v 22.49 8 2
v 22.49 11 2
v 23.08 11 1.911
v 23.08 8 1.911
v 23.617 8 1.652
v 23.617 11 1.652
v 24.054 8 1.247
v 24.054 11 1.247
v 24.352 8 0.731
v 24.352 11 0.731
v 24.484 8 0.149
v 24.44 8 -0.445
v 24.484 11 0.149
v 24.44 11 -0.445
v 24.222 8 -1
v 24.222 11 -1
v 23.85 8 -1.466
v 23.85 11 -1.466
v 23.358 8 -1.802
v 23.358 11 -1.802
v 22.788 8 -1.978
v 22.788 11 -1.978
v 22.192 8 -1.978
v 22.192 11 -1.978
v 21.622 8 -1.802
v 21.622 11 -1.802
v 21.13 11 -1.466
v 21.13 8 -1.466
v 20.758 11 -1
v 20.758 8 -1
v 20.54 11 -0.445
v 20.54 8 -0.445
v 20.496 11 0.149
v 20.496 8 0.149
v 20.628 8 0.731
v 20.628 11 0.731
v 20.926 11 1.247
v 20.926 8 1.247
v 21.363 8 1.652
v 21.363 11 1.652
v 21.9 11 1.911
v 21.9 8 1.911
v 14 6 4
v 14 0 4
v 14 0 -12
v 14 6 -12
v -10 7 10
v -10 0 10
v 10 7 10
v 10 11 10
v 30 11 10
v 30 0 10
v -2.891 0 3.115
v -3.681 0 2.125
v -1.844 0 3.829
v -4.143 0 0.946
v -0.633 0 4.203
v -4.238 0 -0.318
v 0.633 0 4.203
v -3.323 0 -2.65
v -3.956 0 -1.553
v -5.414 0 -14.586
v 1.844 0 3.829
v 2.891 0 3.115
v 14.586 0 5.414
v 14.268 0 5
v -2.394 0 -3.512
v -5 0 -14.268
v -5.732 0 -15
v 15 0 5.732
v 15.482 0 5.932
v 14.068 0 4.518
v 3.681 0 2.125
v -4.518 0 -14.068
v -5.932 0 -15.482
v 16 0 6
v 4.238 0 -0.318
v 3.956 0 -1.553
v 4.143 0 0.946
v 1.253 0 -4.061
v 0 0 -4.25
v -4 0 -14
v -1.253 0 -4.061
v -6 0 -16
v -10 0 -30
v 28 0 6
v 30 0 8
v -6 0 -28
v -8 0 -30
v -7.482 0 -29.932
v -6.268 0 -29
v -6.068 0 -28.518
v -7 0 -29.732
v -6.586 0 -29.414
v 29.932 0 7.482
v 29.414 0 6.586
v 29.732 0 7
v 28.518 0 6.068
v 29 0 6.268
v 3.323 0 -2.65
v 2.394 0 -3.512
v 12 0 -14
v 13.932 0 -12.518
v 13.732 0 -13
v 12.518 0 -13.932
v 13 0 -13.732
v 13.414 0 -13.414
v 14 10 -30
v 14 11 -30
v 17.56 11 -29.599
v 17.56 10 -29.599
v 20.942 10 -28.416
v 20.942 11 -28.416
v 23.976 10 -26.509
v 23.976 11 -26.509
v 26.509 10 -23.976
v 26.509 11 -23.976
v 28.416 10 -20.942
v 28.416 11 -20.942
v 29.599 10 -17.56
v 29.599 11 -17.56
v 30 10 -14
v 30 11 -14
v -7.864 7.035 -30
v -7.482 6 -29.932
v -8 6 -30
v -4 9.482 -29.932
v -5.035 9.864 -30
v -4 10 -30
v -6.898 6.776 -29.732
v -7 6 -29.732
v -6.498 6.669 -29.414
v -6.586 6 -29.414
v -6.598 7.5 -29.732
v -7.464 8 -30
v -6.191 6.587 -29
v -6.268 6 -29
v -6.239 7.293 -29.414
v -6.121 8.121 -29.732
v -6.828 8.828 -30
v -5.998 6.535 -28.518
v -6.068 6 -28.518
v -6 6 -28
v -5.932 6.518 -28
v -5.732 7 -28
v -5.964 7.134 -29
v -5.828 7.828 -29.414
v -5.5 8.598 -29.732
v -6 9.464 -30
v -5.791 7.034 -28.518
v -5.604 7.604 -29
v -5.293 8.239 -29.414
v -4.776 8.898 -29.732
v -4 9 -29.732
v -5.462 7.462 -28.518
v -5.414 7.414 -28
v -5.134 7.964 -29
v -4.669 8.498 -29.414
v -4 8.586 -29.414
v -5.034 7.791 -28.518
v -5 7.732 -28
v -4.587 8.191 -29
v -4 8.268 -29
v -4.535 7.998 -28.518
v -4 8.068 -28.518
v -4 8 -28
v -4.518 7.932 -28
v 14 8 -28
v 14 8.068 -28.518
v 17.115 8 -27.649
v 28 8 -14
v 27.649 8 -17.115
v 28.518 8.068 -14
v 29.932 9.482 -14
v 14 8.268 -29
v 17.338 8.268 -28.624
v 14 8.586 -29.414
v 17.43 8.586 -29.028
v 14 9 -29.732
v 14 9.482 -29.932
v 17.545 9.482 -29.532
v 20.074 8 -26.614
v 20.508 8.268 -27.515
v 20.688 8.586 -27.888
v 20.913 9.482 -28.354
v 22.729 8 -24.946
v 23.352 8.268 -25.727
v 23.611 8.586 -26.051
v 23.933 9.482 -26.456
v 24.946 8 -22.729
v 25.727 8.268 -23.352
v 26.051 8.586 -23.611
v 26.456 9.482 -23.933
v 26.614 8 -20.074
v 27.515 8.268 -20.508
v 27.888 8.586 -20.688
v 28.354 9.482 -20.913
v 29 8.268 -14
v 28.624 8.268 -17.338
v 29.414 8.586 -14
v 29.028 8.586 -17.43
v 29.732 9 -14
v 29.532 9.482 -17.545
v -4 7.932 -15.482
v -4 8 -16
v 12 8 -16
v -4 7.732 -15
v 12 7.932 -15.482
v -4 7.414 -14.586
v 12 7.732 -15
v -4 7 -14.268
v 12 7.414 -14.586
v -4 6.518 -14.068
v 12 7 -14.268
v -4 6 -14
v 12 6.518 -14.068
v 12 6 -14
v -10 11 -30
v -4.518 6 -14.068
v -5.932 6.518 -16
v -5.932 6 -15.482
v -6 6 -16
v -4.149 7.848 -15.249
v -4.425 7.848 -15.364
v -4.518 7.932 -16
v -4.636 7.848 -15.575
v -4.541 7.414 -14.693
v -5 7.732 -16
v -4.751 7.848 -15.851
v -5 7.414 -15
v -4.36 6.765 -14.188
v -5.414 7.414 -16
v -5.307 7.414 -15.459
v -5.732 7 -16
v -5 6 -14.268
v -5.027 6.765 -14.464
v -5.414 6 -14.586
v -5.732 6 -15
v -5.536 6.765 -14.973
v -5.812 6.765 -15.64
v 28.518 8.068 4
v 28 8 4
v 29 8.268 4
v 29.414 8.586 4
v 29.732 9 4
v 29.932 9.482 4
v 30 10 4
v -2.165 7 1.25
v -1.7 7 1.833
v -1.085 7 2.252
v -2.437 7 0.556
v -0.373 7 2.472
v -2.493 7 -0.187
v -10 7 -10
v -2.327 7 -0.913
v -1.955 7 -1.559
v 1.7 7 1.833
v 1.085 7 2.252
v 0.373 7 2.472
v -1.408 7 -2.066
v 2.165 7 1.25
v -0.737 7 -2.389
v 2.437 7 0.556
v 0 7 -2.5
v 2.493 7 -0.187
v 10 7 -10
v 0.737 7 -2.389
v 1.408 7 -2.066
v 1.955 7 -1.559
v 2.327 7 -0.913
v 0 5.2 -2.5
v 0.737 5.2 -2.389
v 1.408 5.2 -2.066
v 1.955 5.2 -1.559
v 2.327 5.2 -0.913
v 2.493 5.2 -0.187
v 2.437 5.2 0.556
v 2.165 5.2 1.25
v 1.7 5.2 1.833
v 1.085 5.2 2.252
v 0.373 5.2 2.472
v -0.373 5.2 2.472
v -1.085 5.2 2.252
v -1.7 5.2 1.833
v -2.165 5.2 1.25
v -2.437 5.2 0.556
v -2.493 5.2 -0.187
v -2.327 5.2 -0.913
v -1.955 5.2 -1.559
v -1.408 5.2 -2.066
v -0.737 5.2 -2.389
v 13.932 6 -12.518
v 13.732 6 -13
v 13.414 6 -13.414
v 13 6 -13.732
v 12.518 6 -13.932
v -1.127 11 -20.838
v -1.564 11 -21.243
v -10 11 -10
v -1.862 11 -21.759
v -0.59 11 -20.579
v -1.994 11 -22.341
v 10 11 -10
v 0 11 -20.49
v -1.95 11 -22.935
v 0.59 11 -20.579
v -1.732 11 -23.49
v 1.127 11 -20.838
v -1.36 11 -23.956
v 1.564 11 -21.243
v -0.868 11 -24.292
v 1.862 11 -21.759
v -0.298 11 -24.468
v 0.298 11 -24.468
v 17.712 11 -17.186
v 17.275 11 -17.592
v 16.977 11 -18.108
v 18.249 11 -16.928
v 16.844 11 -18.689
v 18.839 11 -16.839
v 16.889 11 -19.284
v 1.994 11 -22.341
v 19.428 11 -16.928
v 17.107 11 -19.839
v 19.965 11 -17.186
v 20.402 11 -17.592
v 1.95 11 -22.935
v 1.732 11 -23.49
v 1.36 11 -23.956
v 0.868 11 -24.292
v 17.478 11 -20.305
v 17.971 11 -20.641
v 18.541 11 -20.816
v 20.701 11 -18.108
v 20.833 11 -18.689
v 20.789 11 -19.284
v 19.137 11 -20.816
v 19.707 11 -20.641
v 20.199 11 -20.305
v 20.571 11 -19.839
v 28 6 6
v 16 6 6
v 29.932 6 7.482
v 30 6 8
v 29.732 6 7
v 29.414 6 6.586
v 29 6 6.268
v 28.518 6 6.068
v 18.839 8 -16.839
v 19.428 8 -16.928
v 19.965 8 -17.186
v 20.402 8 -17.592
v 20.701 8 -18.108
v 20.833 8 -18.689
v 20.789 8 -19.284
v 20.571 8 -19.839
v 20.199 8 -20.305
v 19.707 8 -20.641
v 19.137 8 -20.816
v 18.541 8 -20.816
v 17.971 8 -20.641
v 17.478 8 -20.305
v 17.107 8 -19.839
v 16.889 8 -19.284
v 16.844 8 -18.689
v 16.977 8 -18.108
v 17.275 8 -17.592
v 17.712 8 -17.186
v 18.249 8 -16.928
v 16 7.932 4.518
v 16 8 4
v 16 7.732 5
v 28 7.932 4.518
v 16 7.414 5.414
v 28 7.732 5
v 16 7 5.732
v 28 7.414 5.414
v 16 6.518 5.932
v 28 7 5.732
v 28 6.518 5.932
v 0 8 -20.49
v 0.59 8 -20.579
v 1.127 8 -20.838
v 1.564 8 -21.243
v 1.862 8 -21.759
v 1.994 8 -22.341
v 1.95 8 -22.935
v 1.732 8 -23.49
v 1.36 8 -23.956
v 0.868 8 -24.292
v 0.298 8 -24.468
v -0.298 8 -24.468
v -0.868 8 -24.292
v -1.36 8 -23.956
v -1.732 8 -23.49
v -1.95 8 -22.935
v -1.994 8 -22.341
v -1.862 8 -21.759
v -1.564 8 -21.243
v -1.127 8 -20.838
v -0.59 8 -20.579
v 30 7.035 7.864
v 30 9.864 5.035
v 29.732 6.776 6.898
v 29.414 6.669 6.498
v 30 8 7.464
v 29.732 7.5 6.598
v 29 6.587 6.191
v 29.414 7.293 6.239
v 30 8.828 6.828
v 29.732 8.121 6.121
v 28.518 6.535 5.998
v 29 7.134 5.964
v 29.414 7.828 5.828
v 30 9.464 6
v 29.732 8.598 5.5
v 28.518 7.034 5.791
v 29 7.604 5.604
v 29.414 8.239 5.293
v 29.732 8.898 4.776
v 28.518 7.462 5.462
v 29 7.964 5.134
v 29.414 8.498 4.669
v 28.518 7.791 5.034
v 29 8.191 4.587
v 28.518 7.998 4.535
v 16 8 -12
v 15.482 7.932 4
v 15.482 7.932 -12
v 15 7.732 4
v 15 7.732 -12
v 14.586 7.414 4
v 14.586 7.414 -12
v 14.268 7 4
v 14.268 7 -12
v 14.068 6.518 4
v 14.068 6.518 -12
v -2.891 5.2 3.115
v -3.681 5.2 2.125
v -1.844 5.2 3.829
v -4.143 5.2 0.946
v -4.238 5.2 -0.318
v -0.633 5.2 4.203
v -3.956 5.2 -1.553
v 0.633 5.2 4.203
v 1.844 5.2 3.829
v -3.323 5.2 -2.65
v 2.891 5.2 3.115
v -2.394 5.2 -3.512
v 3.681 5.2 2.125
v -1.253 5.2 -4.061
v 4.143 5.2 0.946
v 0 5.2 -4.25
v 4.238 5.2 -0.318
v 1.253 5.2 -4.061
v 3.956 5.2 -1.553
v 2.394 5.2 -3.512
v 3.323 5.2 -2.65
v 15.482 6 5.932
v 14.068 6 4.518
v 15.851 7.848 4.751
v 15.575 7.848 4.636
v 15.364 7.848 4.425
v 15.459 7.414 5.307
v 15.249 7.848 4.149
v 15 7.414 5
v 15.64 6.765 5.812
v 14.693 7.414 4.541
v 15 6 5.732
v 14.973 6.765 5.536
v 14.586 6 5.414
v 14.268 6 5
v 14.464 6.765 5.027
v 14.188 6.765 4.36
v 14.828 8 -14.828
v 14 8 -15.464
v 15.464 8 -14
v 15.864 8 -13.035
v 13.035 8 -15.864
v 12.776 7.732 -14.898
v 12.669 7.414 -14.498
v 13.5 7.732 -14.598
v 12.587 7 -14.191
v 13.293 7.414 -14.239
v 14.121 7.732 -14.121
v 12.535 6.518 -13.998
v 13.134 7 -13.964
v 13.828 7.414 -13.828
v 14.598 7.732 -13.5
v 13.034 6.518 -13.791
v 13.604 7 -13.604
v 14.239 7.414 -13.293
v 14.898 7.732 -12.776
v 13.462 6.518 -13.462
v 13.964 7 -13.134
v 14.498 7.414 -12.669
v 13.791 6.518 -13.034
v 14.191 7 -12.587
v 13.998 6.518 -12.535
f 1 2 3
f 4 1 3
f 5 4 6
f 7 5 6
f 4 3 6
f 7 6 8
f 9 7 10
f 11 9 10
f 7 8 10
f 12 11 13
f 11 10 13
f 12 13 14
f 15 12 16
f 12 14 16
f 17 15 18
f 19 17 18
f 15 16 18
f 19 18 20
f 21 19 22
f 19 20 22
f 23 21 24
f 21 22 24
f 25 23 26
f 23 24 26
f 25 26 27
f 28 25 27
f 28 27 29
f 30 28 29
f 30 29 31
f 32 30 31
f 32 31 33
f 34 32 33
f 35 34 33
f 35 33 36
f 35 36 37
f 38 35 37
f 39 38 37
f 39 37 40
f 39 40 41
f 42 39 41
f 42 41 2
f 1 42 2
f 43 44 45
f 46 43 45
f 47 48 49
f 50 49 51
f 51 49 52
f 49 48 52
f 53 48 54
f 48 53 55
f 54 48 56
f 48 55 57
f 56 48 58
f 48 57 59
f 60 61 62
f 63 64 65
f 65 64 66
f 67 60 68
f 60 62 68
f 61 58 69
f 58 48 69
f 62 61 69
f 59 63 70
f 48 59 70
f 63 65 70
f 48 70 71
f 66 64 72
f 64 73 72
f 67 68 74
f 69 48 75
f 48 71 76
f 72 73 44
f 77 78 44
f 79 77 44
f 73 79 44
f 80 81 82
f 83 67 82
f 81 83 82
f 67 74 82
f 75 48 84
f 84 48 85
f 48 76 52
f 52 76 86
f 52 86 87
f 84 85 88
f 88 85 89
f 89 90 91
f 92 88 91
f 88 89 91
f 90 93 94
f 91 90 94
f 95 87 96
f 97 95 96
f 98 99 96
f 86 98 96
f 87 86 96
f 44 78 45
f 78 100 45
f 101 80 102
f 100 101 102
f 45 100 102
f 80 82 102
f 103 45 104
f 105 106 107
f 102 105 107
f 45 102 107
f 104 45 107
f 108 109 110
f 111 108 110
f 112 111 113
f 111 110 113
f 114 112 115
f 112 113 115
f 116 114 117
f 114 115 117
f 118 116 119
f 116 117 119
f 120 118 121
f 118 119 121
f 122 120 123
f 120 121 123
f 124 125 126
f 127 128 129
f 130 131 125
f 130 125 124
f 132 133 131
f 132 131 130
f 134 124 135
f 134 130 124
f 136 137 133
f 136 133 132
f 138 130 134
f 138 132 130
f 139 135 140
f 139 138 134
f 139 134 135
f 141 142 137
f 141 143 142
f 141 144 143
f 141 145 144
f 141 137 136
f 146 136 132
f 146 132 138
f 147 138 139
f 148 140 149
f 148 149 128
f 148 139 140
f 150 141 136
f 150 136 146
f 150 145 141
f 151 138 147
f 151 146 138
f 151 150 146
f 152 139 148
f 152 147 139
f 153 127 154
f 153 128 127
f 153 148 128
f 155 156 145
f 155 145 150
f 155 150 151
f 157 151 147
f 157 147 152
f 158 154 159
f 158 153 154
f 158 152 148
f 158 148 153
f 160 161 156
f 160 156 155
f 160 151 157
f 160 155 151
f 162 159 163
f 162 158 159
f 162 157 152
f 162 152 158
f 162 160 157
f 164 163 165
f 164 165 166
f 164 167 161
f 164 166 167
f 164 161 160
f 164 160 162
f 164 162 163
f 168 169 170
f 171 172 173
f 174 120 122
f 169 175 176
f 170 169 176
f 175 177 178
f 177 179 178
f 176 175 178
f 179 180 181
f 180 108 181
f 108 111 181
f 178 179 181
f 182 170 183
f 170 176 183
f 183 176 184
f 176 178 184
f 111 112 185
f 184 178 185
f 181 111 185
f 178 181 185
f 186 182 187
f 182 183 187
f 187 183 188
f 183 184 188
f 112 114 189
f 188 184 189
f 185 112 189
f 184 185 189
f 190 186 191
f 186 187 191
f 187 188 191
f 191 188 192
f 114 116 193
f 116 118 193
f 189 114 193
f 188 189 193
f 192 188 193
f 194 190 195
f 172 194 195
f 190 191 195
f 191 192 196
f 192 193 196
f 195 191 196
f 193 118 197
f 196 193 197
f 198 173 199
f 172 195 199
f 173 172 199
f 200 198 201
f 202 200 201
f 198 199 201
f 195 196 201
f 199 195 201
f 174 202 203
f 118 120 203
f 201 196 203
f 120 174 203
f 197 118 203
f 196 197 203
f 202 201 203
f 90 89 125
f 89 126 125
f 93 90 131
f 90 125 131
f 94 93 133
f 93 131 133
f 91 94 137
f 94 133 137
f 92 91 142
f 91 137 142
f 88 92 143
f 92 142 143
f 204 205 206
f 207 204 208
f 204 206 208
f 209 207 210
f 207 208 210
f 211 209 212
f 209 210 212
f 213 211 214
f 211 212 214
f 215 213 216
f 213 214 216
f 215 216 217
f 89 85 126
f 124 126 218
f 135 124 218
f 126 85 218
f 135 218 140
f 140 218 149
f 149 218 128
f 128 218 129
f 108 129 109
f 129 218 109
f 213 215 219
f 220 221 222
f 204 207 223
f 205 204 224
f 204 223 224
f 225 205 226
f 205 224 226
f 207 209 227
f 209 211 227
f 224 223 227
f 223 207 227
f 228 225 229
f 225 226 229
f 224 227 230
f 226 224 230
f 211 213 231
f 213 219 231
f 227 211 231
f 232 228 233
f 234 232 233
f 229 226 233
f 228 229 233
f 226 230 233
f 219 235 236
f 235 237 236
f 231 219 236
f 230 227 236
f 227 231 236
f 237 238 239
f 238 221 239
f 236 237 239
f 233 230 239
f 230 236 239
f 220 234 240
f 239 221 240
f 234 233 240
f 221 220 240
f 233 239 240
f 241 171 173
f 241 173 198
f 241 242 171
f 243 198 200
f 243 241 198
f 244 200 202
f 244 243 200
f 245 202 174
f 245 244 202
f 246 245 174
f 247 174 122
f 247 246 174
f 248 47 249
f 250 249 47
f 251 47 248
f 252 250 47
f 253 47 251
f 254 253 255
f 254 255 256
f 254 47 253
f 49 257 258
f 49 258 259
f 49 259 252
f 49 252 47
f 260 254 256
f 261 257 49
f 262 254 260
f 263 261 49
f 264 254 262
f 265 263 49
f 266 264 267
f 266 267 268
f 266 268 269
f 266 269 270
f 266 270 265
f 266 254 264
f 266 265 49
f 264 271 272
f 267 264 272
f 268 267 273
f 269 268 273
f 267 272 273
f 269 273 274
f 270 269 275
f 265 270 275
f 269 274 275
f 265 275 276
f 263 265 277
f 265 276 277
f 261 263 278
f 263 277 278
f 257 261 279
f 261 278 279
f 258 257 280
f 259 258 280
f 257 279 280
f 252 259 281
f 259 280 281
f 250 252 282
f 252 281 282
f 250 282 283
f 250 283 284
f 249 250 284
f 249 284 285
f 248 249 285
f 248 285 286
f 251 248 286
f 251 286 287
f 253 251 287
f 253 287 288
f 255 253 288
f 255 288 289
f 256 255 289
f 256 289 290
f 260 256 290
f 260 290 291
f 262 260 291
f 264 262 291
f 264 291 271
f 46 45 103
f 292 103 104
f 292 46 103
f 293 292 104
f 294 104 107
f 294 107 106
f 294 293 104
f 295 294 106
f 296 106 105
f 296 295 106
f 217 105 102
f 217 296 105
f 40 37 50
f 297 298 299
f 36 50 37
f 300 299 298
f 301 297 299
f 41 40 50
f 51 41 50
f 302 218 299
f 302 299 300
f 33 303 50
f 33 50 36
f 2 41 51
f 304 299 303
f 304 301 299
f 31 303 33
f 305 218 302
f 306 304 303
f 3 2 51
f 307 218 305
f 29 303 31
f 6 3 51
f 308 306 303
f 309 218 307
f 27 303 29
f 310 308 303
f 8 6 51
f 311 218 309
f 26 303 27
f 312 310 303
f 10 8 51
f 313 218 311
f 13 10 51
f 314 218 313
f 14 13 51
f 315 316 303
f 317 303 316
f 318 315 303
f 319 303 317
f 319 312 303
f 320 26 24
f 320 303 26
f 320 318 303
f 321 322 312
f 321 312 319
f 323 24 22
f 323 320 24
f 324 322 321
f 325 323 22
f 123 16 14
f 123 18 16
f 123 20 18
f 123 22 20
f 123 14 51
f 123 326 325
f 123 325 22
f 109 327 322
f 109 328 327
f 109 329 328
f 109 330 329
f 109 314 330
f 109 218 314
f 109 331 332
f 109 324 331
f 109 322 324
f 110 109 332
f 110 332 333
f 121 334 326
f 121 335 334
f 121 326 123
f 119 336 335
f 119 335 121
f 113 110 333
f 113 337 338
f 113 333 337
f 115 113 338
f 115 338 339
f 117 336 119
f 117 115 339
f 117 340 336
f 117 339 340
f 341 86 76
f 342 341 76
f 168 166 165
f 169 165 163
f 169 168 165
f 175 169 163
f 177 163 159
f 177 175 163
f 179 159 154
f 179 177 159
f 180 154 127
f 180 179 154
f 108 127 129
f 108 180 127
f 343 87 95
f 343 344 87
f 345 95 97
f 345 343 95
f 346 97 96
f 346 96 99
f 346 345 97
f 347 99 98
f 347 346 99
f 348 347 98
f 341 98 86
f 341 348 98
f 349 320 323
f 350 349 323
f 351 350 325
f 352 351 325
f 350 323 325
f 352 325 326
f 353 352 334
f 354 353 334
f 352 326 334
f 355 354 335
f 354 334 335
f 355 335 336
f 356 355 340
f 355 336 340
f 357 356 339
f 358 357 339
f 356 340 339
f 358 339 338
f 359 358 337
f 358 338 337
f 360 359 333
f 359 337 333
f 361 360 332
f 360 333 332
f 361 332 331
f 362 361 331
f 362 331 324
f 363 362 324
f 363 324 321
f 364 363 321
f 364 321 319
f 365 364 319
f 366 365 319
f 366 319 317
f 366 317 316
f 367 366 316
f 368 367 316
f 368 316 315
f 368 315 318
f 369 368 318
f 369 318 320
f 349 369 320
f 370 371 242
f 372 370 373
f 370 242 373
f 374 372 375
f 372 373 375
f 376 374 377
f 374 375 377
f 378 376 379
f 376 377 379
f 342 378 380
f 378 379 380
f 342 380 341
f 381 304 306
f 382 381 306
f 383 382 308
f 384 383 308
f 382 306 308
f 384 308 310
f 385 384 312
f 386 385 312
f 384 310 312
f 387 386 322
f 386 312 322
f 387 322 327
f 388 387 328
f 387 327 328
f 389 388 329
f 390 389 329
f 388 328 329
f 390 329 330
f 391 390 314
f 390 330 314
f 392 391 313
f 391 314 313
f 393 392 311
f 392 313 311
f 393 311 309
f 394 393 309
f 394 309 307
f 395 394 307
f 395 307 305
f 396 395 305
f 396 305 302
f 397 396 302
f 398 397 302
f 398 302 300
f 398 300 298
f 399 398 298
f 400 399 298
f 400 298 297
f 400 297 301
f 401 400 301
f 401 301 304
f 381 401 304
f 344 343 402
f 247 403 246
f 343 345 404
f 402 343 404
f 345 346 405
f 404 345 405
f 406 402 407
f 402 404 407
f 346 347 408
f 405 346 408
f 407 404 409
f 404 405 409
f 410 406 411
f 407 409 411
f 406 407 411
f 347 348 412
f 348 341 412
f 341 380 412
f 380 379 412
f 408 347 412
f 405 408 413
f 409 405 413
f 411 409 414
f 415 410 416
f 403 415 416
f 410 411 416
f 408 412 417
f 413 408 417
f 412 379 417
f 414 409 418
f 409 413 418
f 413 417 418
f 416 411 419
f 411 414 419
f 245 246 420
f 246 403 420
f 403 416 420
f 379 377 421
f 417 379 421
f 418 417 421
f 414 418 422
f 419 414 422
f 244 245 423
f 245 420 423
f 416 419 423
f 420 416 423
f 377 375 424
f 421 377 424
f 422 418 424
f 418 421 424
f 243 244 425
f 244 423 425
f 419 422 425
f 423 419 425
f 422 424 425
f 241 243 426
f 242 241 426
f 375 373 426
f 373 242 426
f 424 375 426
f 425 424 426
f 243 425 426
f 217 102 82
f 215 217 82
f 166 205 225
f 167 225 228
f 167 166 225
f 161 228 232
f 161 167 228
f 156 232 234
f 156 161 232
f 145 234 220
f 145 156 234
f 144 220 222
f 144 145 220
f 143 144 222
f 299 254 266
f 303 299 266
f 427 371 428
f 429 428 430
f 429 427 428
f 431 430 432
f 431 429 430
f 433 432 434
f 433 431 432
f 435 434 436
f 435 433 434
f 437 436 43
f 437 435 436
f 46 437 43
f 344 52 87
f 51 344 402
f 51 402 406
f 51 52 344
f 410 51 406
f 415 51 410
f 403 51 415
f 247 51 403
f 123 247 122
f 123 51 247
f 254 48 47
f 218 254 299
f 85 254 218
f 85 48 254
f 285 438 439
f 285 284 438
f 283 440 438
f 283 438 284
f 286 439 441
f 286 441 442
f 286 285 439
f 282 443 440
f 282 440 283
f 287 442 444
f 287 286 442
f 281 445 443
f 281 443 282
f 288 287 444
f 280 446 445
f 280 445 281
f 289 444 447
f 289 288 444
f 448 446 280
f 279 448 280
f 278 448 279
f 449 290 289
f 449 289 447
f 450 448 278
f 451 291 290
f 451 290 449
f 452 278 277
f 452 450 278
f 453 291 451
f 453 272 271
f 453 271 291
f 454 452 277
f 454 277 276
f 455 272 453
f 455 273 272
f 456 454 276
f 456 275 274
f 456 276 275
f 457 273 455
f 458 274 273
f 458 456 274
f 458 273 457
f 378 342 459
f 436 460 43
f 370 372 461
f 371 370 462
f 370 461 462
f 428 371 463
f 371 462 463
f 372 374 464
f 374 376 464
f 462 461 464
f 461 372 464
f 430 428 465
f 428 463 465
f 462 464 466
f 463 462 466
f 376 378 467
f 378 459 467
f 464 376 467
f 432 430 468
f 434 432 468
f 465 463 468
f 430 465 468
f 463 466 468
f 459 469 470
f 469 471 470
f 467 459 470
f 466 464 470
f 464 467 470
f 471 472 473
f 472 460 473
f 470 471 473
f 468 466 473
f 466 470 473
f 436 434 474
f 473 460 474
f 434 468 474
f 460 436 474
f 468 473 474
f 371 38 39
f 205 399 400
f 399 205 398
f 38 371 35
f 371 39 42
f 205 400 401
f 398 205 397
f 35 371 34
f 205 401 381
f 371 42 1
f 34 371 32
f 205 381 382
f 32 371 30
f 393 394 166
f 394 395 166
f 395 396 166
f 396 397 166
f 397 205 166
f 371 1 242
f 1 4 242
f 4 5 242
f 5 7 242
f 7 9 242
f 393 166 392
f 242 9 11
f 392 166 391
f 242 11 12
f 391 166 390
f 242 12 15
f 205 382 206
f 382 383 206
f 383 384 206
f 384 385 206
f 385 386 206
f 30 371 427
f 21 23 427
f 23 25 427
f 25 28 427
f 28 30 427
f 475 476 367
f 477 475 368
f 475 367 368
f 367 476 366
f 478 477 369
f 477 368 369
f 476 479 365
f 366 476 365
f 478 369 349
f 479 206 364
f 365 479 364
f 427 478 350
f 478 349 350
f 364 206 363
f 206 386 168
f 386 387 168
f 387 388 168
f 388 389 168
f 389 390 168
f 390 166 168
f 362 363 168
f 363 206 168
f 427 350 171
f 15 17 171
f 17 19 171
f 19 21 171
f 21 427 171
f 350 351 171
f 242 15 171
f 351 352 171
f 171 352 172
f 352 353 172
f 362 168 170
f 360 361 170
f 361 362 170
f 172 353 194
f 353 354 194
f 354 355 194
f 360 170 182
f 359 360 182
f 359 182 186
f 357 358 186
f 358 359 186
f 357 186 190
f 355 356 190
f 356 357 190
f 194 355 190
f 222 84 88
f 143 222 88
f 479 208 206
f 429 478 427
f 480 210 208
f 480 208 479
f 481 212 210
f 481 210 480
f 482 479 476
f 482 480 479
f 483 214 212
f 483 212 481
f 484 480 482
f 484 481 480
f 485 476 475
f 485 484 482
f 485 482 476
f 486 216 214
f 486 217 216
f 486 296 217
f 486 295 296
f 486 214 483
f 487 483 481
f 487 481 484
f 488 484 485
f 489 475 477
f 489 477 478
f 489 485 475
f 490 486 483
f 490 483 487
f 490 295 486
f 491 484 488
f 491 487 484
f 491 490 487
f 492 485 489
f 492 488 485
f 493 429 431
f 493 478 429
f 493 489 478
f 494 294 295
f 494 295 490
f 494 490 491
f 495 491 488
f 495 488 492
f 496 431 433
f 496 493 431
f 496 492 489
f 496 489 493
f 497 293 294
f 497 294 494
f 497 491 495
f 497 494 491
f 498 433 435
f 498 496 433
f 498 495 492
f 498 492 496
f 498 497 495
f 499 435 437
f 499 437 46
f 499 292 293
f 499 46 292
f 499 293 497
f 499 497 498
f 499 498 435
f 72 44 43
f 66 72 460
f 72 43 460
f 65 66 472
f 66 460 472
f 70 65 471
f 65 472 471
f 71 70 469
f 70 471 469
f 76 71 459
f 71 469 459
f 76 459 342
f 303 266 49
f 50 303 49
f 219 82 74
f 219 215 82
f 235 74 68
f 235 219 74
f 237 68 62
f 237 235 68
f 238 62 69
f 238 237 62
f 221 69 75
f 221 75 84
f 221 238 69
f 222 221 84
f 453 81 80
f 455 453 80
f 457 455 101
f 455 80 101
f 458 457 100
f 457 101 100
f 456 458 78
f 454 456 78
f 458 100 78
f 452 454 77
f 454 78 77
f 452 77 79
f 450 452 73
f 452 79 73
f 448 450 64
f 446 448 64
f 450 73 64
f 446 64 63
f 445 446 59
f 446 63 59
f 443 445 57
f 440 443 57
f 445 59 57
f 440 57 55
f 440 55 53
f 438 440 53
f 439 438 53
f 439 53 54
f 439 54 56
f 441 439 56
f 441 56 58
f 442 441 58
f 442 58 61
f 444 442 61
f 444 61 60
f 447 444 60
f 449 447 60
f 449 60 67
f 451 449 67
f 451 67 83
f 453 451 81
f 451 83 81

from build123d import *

# Parameters (mm, degrees)
SKETCH1_W           = 4
SKETCH1_H           = 16
BOSS_EXTRUDE1_DEPTH = 11
SKETCH2_W           = 20
SKETCH2_H           = 20
BOSS_EXTRUDE2_DEPTH = 7
SKETCH3_W           = 20
SKETCH3_H           = 16
SKETCH3_W_2         = 16
SKETCH3_H_2         = 20
BOSS_EXTRUDE3_DEPTH = 3
FILLET1_R           = 2
SKETCH4_R           = 2.5
CUT_EXTRUDE1_DEPTH  = 10
SKETCH5_R           = 4.25
CUT_EXTRUDE2_DEPTH  = 5.2
SKETCH6_R           = 2
CUT_EXTRUDE3_DEPTH  = 5.2


with BuildPart() as part:
    # Sketch1 → Boss-Extrude1 (new body)
    with BuildSketch(Plane(origin=(0, 0, 0), x_dir=(1, 0, 0), z_dir=(0, 1, 0))):
        Polygon((-10, 10), (-6, 10), (-6, 14), (-6, 30), (-10, 30), align=None)
        Polygon((-6, 10), (10, 10), (14, 10), (14, 14), (-6, 14), align=None)
        with Locations((12, 2)):
            Rectangle(SKETCH1_W, SKETCH1_H)
        Polygon((10, -6), (10, -10), (30, -10), (30, -6), (14, -6), align=None)
    extrude(amount=BOSS_EXTRUDE1_DEPTH)

    # Sketch2 → Boss-Extrude2 (add)
    with BuildSketch(Plane(origin=(0, 0, 0), x_dir=(1, 0, 0), z_dir=(0, 1, 0))):
        Rectangle(SKETCH2_W, SKETCH2_H)
    extrude(amount=BOSS_EXTRUDE2_DEPTH)

    # Sketch3 → Boss-Extrude3 (add)
    with BuildSketch(Plane(origin=(0, 11, 0), x_dir=(1, 0, 0), z_dir=(0, 1, 0))):
        with Locations((4, 22)):
            Rectangle(SKETCH3_W, SKETCH3_H)
        with BuildLine():
            Line((30, 14), (14, 14))
            Line((14, 14), (14, 30))
            ThreePointArc((14, 30), (25.313708499, 25.313708499), (30, 14))
        make_face()
        with Locations((22, 4)):
            Rectangle(SKETCH3_W_2, SKETCH3_H_2)
    extrude(amount=-BOSS_EXTRUDE3_DEPTH)

    # Fillet1
    fillet1_edges = [part.edges().sort_by_distance(p)[0] for p in [
        (-6, 4, -30),
        (-6, 4, -14),
        (14, 4, -14),
        (14, 4, 6),
        (30, 4, 6),
        (25.313708499, 8, -25.313708499),
        (30, 8, -4),
        (4, 8, -14),
        (-6, 8, -22),
        (4, 8, -30),
        (22, 8, 6),
        (14, 8, -4),
    ]]
    fillet(fillet1_edges, radius=FILLET1_R)

    # Sketch4 → Cut-Extrude1 (cut)
    with BuildSketch(Plane.XZ):
        with Locations(Location((0, 0, 0), (0, 0, 270))):
            Circle(SKETCH4_R)
    extrude(amount=-CUT_EXTRUDE1_DEPTH, mode=Mode.SUBTRACT)

    # Sketch5 → Cut-Extrude2 (cut)
    with BuildSketch(Plane.XZ):
        with Locations(Location((0, 0, 0), (0, 0, 270))):
            Circle(SKETCH5_R)
    extrude(amount=-CUT_EXTRUDE2_DEPTH, mode=Mode.SUBTRACT)

    # Sketch6 → Cut-Extrude3 (cut)
    with BuildSketch(Plane(origin=(0, 11, 0), x_dir=(1, 0, 0), z_dir=(0, 1, 0))):
        with Locations(Location((22.489995997, 0, 0), (0, 0, 270))):
            Circle(SKETCH6_R)
        with Locations(Location((0, 22.489995997, 0), (0, 0, 270))):
            Circle(SKETCH6_R)
        with Locations(Location((18.838834765, 18.838834765, 0), (0, 0, 270))):
            Circle(SKETCH6_R)
    extrude(amount=-CUT_EXTRUDE3_DEPTH, mode=Mode.SUBTRACT)


solid = part.part
